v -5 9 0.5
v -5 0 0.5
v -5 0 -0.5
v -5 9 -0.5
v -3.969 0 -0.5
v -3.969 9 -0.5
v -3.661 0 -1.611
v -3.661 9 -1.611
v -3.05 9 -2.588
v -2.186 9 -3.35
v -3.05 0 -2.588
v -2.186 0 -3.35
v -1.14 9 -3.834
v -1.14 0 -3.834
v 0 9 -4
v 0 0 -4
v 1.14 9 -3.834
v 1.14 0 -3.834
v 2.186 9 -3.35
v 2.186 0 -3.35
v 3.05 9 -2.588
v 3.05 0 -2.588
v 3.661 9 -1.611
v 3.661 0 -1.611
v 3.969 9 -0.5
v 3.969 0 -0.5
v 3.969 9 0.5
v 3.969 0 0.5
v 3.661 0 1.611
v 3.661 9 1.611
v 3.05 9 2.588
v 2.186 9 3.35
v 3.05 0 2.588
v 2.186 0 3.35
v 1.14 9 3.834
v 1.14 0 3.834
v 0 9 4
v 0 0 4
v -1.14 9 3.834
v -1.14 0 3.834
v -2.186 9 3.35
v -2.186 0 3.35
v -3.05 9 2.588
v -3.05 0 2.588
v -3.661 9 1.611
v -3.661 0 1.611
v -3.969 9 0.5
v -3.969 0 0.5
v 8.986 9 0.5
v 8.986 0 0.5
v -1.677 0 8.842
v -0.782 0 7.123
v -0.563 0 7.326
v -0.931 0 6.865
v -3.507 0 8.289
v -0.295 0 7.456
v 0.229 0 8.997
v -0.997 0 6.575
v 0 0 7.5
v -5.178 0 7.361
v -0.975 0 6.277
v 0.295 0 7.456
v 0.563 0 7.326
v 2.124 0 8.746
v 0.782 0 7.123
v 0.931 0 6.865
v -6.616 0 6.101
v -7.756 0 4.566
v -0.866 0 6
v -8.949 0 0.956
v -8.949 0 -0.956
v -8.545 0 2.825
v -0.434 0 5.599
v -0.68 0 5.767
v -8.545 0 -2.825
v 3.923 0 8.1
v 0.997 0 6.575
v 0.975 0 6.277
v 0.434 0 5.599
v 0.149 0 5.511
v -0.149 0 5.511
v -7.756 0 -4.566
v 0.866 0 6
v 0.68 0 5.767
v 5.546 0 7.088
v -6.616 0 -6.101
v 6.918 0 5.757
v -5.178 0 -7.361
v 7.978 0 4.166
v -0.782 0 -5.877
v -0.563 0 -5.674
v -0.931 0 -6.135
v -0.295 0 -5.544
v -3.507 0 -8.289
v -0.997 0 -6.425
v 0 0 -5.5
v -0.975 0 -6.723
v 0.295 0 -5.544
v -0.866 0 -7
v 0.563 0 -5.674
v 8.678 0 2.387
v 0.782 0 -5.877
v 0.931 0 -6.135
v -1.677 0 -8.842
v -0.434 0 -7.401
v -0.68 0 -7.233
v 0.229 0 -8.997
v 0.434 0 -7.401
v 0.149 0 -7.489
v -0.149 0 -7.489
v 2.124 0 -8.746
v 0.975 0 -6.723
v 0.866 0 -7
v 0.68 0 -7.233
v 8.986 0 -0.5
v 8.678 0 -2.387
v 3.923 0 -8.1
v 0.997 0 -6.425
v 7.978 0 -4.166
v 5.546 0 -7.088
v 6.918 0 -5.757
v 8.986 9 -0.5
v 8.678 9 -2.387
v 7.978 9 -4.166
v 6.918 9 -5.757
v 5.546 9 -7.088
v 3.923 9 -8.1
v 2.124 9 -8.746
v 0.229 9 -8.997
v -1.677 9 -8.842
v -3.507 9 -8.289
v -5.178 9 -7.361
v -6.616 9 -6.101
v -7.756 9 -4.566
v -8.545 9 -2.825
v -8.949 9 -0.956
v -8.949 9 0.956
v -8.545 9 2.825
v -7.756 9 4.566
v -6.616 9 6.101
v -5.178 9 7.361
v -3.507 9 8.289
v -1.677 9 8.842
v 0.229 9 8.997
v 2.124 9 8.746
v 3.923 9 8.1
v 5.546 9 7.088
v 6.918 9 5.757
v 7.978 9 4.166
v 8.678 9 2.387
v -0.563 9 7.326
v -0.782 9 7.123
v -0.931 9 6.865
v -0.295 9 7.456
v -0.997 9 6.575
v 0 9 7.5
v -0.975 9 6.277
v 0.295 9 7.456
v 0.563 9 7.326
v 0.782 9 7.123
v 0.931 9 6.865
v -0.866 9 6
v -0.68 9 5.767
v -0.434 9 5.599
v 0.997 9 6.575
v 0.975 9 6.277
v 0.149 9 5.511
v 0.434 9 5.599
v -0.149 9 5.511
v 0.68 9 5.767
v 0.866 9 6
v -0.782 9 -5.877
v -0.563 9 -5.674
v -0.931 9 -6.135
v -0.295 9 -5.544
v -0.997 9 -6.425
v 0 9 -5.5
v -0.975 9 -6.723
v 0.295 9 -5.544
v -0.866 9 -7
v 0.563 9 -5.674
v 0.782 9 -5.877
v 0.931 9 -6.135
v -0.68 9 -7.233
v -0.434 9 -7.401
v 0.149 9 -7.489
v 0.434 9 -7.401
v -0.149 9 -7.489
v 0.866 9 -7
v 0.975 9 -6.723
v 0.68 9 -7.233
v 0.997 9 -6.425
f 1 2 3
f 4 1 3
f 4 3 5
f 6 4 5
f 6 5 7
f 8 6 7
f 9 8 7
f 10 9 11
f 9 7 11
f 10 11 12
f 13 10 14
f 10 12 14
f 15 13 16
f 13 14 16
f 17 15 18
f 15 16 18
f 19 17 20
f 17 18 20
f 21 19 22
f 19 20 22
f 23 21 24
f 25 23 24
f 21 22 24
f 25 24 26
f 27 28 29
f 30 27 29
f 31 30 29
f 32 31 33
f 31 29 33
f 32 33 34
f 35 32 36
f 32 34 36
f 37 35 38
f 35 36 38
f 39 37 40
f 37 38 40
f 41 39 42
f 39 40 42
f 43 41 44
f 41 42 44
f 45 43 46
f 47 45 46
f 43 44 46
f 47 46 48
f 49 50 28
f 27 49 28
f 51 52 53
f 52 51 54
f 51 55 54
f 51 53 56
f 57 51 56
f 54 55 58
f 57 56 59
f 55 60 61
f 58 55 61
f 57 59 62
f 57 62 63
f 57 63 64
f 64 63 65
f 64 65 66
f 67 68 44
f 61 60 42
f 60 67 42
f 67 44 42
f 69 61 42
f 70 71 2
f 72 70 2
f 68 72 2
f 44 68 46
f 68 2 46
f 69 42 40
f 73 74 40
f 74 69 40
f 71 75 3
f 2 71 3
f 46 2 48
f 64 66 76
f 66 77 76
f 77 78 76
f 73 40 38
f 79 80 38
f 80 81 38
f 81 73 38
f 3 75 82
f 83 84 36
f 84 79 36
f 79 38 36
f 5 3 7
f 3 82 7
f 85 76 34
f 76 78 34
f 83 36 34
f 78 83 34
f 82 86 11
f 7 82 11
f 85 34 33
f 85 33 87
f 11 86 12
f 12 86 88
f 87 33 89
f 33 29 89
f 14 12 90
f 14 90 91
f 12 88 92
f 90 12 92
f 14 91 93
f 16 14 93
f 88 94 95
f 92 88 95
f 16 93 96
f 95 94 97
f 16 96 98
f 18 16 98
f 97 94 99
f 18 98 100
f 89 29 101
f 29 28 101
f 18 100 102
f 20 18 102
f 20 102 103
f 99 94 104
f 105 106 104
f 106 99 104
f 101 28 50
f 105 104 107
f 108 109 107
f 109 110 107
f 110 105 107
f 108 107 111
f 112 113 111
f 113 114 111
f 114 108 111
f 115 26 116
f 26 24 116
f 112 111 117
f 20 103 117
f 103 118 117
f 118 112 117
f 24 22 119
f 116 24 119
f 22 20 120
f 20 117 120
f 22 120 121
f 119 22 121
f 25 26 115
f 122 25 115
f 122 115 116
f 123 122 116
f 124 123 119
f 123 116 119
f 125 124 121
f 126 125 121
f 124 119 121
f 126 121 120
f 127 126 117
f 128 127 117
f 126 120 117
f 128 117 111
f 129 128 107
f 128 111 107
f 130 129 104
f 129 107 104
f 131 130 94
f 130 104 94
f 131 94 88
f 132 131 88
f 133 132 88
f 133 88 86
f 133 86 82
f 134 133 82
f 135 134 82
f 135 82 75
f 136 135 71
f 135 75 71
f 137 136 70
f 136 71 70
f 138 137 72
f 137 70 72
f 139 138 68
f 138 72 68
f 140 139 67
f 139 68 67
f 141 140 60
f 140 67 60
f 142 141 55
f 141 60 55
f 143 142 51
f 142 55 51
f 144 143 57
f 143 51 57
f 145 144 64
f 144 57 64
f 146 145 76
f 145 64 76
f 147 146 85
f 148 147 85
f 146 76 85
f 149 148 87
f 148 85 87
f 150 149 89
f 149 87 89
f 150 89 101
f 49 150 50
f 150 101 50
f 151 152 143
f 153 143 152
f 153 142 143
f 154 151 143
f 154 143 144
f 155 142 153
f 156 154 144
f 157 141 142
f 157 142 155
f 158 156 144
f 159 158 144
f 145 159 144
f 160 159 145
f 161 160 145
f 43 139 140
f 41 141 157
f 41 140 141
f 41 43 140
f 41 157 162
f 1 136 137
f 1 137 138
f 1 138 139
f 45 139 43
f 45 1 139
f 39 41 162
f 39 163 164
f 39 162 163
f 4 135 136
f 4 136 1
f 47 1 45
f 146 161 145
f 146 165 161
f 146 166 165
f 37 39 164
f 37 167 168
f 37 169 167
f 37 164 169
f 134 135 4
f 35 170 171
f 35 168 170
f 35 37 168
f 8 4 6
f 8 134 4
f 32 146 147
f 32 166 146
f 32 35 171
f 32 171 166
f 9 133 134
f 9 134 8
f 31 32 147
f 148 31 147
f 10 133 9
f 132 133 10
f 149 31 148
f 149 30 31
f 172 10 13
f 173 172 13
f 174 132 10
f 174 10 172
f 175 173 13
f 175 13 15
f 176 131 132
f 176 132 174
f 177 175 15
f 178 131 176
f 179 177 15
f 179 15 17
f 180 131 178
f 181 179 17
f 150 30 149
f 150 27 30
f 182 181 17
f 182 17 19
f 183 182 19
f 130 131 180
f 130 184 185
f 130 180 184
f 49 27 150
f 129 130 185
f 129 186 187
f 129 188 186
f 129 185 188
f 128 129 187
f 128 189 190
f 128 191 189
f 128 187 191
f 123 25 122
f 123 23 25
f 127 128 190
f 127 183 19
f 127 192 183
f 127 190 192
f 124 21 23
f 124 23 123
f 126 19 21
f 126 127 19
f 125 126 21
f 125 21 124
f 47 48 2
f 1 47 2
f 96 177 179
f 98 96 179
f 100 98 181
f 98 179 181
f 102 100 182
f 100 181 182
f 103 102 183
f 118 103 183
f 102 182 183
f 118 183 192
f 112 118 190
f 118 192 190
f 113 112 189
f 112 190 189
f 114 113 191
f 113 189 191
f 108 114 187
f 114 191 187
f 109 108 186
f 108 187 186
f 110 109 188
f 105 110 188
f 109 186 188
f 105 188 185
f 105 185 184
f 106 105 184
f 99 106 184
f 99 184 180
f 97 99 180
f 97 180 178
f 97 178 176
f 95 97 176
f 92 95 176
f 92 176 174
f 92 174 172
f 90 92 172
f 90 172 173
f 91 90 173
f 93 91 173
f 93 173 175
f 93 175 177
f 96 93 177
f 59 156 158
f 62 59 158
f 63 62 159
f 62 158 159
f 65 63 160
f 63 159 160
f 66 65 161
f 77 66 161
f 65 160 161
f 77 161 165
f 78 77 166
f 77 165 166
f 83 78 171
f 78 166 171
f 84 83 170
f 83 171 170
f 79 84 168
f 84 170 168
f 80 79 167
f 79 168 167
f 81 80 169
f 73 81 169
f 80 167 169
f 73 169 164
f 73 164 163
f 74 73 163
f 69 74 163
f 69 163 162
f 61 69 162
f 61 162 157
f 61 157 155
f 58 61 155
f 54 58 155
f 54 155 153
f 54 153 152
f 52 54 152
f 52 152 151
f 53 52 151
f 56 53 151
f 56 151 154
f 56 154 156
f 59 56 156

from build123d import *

# Parameters (mm, degrees)
BOSS_EXTRU_1_DEPTH      = 9
ESQUISSE2_R             = 1
ENL_V_MAT_EXTRU_1_DEPTH = 16.588457268


with BuildPart() as part:
    # Esquisse1 → Boss.-Extru.1 (new body)
    with BuildSketch(Plane(origin=(0, 0, 0), x_dir=(1, 0, 0), z_dir=(0, 1, 0))):
        with BuildLine():
            Line((3.968626967, 0.5), (8.986100378, 0.5))
            ThreePointArc((8.986100378, 0.5), (-9, 0), (8.986100378, -0.5))
            Line((8.986100378, -0.5), (3.968626967, -0.5))
            ThreePointArc((3.968626967, -0.5), (0, -4), (-3.968626967, -0.5))
            Line((-3.968626967, -0.5), (-5, -0.5))
            Line((-5, -0.5), (-5, 0.5))
            Line((-5, 0.5), (-3.968626967, 0.5))
            ThreePointArc((-3.968626967, 0.5), (0, 4), (3.968626967, 0.5))
        make_face()
    extrude(amount=BOSS_EXTRU_1_DEPTH)

    # Esquisse2 → Enlèv. mat.-Extru.1 (cut, through all)
    with BuildSketch(Plane(origin=(0, 9, 0), x_dir=(1, 0, 0), z_dir=(0, 1, 0))):
        with Locations(Location((0, -6.5, 0), (0, 0, 270))):
            Circle(ESQUISSE2_R)
        with Locations(Location((0, 6.5, 0), (0, 0, 270))):
            Circle(ESQUISSE2_R)
    extrude(amount=-ENL_V_MAT_EXTRU_1_DEPTH, mode=Mode.SUBTRACT)


solid = part.part
